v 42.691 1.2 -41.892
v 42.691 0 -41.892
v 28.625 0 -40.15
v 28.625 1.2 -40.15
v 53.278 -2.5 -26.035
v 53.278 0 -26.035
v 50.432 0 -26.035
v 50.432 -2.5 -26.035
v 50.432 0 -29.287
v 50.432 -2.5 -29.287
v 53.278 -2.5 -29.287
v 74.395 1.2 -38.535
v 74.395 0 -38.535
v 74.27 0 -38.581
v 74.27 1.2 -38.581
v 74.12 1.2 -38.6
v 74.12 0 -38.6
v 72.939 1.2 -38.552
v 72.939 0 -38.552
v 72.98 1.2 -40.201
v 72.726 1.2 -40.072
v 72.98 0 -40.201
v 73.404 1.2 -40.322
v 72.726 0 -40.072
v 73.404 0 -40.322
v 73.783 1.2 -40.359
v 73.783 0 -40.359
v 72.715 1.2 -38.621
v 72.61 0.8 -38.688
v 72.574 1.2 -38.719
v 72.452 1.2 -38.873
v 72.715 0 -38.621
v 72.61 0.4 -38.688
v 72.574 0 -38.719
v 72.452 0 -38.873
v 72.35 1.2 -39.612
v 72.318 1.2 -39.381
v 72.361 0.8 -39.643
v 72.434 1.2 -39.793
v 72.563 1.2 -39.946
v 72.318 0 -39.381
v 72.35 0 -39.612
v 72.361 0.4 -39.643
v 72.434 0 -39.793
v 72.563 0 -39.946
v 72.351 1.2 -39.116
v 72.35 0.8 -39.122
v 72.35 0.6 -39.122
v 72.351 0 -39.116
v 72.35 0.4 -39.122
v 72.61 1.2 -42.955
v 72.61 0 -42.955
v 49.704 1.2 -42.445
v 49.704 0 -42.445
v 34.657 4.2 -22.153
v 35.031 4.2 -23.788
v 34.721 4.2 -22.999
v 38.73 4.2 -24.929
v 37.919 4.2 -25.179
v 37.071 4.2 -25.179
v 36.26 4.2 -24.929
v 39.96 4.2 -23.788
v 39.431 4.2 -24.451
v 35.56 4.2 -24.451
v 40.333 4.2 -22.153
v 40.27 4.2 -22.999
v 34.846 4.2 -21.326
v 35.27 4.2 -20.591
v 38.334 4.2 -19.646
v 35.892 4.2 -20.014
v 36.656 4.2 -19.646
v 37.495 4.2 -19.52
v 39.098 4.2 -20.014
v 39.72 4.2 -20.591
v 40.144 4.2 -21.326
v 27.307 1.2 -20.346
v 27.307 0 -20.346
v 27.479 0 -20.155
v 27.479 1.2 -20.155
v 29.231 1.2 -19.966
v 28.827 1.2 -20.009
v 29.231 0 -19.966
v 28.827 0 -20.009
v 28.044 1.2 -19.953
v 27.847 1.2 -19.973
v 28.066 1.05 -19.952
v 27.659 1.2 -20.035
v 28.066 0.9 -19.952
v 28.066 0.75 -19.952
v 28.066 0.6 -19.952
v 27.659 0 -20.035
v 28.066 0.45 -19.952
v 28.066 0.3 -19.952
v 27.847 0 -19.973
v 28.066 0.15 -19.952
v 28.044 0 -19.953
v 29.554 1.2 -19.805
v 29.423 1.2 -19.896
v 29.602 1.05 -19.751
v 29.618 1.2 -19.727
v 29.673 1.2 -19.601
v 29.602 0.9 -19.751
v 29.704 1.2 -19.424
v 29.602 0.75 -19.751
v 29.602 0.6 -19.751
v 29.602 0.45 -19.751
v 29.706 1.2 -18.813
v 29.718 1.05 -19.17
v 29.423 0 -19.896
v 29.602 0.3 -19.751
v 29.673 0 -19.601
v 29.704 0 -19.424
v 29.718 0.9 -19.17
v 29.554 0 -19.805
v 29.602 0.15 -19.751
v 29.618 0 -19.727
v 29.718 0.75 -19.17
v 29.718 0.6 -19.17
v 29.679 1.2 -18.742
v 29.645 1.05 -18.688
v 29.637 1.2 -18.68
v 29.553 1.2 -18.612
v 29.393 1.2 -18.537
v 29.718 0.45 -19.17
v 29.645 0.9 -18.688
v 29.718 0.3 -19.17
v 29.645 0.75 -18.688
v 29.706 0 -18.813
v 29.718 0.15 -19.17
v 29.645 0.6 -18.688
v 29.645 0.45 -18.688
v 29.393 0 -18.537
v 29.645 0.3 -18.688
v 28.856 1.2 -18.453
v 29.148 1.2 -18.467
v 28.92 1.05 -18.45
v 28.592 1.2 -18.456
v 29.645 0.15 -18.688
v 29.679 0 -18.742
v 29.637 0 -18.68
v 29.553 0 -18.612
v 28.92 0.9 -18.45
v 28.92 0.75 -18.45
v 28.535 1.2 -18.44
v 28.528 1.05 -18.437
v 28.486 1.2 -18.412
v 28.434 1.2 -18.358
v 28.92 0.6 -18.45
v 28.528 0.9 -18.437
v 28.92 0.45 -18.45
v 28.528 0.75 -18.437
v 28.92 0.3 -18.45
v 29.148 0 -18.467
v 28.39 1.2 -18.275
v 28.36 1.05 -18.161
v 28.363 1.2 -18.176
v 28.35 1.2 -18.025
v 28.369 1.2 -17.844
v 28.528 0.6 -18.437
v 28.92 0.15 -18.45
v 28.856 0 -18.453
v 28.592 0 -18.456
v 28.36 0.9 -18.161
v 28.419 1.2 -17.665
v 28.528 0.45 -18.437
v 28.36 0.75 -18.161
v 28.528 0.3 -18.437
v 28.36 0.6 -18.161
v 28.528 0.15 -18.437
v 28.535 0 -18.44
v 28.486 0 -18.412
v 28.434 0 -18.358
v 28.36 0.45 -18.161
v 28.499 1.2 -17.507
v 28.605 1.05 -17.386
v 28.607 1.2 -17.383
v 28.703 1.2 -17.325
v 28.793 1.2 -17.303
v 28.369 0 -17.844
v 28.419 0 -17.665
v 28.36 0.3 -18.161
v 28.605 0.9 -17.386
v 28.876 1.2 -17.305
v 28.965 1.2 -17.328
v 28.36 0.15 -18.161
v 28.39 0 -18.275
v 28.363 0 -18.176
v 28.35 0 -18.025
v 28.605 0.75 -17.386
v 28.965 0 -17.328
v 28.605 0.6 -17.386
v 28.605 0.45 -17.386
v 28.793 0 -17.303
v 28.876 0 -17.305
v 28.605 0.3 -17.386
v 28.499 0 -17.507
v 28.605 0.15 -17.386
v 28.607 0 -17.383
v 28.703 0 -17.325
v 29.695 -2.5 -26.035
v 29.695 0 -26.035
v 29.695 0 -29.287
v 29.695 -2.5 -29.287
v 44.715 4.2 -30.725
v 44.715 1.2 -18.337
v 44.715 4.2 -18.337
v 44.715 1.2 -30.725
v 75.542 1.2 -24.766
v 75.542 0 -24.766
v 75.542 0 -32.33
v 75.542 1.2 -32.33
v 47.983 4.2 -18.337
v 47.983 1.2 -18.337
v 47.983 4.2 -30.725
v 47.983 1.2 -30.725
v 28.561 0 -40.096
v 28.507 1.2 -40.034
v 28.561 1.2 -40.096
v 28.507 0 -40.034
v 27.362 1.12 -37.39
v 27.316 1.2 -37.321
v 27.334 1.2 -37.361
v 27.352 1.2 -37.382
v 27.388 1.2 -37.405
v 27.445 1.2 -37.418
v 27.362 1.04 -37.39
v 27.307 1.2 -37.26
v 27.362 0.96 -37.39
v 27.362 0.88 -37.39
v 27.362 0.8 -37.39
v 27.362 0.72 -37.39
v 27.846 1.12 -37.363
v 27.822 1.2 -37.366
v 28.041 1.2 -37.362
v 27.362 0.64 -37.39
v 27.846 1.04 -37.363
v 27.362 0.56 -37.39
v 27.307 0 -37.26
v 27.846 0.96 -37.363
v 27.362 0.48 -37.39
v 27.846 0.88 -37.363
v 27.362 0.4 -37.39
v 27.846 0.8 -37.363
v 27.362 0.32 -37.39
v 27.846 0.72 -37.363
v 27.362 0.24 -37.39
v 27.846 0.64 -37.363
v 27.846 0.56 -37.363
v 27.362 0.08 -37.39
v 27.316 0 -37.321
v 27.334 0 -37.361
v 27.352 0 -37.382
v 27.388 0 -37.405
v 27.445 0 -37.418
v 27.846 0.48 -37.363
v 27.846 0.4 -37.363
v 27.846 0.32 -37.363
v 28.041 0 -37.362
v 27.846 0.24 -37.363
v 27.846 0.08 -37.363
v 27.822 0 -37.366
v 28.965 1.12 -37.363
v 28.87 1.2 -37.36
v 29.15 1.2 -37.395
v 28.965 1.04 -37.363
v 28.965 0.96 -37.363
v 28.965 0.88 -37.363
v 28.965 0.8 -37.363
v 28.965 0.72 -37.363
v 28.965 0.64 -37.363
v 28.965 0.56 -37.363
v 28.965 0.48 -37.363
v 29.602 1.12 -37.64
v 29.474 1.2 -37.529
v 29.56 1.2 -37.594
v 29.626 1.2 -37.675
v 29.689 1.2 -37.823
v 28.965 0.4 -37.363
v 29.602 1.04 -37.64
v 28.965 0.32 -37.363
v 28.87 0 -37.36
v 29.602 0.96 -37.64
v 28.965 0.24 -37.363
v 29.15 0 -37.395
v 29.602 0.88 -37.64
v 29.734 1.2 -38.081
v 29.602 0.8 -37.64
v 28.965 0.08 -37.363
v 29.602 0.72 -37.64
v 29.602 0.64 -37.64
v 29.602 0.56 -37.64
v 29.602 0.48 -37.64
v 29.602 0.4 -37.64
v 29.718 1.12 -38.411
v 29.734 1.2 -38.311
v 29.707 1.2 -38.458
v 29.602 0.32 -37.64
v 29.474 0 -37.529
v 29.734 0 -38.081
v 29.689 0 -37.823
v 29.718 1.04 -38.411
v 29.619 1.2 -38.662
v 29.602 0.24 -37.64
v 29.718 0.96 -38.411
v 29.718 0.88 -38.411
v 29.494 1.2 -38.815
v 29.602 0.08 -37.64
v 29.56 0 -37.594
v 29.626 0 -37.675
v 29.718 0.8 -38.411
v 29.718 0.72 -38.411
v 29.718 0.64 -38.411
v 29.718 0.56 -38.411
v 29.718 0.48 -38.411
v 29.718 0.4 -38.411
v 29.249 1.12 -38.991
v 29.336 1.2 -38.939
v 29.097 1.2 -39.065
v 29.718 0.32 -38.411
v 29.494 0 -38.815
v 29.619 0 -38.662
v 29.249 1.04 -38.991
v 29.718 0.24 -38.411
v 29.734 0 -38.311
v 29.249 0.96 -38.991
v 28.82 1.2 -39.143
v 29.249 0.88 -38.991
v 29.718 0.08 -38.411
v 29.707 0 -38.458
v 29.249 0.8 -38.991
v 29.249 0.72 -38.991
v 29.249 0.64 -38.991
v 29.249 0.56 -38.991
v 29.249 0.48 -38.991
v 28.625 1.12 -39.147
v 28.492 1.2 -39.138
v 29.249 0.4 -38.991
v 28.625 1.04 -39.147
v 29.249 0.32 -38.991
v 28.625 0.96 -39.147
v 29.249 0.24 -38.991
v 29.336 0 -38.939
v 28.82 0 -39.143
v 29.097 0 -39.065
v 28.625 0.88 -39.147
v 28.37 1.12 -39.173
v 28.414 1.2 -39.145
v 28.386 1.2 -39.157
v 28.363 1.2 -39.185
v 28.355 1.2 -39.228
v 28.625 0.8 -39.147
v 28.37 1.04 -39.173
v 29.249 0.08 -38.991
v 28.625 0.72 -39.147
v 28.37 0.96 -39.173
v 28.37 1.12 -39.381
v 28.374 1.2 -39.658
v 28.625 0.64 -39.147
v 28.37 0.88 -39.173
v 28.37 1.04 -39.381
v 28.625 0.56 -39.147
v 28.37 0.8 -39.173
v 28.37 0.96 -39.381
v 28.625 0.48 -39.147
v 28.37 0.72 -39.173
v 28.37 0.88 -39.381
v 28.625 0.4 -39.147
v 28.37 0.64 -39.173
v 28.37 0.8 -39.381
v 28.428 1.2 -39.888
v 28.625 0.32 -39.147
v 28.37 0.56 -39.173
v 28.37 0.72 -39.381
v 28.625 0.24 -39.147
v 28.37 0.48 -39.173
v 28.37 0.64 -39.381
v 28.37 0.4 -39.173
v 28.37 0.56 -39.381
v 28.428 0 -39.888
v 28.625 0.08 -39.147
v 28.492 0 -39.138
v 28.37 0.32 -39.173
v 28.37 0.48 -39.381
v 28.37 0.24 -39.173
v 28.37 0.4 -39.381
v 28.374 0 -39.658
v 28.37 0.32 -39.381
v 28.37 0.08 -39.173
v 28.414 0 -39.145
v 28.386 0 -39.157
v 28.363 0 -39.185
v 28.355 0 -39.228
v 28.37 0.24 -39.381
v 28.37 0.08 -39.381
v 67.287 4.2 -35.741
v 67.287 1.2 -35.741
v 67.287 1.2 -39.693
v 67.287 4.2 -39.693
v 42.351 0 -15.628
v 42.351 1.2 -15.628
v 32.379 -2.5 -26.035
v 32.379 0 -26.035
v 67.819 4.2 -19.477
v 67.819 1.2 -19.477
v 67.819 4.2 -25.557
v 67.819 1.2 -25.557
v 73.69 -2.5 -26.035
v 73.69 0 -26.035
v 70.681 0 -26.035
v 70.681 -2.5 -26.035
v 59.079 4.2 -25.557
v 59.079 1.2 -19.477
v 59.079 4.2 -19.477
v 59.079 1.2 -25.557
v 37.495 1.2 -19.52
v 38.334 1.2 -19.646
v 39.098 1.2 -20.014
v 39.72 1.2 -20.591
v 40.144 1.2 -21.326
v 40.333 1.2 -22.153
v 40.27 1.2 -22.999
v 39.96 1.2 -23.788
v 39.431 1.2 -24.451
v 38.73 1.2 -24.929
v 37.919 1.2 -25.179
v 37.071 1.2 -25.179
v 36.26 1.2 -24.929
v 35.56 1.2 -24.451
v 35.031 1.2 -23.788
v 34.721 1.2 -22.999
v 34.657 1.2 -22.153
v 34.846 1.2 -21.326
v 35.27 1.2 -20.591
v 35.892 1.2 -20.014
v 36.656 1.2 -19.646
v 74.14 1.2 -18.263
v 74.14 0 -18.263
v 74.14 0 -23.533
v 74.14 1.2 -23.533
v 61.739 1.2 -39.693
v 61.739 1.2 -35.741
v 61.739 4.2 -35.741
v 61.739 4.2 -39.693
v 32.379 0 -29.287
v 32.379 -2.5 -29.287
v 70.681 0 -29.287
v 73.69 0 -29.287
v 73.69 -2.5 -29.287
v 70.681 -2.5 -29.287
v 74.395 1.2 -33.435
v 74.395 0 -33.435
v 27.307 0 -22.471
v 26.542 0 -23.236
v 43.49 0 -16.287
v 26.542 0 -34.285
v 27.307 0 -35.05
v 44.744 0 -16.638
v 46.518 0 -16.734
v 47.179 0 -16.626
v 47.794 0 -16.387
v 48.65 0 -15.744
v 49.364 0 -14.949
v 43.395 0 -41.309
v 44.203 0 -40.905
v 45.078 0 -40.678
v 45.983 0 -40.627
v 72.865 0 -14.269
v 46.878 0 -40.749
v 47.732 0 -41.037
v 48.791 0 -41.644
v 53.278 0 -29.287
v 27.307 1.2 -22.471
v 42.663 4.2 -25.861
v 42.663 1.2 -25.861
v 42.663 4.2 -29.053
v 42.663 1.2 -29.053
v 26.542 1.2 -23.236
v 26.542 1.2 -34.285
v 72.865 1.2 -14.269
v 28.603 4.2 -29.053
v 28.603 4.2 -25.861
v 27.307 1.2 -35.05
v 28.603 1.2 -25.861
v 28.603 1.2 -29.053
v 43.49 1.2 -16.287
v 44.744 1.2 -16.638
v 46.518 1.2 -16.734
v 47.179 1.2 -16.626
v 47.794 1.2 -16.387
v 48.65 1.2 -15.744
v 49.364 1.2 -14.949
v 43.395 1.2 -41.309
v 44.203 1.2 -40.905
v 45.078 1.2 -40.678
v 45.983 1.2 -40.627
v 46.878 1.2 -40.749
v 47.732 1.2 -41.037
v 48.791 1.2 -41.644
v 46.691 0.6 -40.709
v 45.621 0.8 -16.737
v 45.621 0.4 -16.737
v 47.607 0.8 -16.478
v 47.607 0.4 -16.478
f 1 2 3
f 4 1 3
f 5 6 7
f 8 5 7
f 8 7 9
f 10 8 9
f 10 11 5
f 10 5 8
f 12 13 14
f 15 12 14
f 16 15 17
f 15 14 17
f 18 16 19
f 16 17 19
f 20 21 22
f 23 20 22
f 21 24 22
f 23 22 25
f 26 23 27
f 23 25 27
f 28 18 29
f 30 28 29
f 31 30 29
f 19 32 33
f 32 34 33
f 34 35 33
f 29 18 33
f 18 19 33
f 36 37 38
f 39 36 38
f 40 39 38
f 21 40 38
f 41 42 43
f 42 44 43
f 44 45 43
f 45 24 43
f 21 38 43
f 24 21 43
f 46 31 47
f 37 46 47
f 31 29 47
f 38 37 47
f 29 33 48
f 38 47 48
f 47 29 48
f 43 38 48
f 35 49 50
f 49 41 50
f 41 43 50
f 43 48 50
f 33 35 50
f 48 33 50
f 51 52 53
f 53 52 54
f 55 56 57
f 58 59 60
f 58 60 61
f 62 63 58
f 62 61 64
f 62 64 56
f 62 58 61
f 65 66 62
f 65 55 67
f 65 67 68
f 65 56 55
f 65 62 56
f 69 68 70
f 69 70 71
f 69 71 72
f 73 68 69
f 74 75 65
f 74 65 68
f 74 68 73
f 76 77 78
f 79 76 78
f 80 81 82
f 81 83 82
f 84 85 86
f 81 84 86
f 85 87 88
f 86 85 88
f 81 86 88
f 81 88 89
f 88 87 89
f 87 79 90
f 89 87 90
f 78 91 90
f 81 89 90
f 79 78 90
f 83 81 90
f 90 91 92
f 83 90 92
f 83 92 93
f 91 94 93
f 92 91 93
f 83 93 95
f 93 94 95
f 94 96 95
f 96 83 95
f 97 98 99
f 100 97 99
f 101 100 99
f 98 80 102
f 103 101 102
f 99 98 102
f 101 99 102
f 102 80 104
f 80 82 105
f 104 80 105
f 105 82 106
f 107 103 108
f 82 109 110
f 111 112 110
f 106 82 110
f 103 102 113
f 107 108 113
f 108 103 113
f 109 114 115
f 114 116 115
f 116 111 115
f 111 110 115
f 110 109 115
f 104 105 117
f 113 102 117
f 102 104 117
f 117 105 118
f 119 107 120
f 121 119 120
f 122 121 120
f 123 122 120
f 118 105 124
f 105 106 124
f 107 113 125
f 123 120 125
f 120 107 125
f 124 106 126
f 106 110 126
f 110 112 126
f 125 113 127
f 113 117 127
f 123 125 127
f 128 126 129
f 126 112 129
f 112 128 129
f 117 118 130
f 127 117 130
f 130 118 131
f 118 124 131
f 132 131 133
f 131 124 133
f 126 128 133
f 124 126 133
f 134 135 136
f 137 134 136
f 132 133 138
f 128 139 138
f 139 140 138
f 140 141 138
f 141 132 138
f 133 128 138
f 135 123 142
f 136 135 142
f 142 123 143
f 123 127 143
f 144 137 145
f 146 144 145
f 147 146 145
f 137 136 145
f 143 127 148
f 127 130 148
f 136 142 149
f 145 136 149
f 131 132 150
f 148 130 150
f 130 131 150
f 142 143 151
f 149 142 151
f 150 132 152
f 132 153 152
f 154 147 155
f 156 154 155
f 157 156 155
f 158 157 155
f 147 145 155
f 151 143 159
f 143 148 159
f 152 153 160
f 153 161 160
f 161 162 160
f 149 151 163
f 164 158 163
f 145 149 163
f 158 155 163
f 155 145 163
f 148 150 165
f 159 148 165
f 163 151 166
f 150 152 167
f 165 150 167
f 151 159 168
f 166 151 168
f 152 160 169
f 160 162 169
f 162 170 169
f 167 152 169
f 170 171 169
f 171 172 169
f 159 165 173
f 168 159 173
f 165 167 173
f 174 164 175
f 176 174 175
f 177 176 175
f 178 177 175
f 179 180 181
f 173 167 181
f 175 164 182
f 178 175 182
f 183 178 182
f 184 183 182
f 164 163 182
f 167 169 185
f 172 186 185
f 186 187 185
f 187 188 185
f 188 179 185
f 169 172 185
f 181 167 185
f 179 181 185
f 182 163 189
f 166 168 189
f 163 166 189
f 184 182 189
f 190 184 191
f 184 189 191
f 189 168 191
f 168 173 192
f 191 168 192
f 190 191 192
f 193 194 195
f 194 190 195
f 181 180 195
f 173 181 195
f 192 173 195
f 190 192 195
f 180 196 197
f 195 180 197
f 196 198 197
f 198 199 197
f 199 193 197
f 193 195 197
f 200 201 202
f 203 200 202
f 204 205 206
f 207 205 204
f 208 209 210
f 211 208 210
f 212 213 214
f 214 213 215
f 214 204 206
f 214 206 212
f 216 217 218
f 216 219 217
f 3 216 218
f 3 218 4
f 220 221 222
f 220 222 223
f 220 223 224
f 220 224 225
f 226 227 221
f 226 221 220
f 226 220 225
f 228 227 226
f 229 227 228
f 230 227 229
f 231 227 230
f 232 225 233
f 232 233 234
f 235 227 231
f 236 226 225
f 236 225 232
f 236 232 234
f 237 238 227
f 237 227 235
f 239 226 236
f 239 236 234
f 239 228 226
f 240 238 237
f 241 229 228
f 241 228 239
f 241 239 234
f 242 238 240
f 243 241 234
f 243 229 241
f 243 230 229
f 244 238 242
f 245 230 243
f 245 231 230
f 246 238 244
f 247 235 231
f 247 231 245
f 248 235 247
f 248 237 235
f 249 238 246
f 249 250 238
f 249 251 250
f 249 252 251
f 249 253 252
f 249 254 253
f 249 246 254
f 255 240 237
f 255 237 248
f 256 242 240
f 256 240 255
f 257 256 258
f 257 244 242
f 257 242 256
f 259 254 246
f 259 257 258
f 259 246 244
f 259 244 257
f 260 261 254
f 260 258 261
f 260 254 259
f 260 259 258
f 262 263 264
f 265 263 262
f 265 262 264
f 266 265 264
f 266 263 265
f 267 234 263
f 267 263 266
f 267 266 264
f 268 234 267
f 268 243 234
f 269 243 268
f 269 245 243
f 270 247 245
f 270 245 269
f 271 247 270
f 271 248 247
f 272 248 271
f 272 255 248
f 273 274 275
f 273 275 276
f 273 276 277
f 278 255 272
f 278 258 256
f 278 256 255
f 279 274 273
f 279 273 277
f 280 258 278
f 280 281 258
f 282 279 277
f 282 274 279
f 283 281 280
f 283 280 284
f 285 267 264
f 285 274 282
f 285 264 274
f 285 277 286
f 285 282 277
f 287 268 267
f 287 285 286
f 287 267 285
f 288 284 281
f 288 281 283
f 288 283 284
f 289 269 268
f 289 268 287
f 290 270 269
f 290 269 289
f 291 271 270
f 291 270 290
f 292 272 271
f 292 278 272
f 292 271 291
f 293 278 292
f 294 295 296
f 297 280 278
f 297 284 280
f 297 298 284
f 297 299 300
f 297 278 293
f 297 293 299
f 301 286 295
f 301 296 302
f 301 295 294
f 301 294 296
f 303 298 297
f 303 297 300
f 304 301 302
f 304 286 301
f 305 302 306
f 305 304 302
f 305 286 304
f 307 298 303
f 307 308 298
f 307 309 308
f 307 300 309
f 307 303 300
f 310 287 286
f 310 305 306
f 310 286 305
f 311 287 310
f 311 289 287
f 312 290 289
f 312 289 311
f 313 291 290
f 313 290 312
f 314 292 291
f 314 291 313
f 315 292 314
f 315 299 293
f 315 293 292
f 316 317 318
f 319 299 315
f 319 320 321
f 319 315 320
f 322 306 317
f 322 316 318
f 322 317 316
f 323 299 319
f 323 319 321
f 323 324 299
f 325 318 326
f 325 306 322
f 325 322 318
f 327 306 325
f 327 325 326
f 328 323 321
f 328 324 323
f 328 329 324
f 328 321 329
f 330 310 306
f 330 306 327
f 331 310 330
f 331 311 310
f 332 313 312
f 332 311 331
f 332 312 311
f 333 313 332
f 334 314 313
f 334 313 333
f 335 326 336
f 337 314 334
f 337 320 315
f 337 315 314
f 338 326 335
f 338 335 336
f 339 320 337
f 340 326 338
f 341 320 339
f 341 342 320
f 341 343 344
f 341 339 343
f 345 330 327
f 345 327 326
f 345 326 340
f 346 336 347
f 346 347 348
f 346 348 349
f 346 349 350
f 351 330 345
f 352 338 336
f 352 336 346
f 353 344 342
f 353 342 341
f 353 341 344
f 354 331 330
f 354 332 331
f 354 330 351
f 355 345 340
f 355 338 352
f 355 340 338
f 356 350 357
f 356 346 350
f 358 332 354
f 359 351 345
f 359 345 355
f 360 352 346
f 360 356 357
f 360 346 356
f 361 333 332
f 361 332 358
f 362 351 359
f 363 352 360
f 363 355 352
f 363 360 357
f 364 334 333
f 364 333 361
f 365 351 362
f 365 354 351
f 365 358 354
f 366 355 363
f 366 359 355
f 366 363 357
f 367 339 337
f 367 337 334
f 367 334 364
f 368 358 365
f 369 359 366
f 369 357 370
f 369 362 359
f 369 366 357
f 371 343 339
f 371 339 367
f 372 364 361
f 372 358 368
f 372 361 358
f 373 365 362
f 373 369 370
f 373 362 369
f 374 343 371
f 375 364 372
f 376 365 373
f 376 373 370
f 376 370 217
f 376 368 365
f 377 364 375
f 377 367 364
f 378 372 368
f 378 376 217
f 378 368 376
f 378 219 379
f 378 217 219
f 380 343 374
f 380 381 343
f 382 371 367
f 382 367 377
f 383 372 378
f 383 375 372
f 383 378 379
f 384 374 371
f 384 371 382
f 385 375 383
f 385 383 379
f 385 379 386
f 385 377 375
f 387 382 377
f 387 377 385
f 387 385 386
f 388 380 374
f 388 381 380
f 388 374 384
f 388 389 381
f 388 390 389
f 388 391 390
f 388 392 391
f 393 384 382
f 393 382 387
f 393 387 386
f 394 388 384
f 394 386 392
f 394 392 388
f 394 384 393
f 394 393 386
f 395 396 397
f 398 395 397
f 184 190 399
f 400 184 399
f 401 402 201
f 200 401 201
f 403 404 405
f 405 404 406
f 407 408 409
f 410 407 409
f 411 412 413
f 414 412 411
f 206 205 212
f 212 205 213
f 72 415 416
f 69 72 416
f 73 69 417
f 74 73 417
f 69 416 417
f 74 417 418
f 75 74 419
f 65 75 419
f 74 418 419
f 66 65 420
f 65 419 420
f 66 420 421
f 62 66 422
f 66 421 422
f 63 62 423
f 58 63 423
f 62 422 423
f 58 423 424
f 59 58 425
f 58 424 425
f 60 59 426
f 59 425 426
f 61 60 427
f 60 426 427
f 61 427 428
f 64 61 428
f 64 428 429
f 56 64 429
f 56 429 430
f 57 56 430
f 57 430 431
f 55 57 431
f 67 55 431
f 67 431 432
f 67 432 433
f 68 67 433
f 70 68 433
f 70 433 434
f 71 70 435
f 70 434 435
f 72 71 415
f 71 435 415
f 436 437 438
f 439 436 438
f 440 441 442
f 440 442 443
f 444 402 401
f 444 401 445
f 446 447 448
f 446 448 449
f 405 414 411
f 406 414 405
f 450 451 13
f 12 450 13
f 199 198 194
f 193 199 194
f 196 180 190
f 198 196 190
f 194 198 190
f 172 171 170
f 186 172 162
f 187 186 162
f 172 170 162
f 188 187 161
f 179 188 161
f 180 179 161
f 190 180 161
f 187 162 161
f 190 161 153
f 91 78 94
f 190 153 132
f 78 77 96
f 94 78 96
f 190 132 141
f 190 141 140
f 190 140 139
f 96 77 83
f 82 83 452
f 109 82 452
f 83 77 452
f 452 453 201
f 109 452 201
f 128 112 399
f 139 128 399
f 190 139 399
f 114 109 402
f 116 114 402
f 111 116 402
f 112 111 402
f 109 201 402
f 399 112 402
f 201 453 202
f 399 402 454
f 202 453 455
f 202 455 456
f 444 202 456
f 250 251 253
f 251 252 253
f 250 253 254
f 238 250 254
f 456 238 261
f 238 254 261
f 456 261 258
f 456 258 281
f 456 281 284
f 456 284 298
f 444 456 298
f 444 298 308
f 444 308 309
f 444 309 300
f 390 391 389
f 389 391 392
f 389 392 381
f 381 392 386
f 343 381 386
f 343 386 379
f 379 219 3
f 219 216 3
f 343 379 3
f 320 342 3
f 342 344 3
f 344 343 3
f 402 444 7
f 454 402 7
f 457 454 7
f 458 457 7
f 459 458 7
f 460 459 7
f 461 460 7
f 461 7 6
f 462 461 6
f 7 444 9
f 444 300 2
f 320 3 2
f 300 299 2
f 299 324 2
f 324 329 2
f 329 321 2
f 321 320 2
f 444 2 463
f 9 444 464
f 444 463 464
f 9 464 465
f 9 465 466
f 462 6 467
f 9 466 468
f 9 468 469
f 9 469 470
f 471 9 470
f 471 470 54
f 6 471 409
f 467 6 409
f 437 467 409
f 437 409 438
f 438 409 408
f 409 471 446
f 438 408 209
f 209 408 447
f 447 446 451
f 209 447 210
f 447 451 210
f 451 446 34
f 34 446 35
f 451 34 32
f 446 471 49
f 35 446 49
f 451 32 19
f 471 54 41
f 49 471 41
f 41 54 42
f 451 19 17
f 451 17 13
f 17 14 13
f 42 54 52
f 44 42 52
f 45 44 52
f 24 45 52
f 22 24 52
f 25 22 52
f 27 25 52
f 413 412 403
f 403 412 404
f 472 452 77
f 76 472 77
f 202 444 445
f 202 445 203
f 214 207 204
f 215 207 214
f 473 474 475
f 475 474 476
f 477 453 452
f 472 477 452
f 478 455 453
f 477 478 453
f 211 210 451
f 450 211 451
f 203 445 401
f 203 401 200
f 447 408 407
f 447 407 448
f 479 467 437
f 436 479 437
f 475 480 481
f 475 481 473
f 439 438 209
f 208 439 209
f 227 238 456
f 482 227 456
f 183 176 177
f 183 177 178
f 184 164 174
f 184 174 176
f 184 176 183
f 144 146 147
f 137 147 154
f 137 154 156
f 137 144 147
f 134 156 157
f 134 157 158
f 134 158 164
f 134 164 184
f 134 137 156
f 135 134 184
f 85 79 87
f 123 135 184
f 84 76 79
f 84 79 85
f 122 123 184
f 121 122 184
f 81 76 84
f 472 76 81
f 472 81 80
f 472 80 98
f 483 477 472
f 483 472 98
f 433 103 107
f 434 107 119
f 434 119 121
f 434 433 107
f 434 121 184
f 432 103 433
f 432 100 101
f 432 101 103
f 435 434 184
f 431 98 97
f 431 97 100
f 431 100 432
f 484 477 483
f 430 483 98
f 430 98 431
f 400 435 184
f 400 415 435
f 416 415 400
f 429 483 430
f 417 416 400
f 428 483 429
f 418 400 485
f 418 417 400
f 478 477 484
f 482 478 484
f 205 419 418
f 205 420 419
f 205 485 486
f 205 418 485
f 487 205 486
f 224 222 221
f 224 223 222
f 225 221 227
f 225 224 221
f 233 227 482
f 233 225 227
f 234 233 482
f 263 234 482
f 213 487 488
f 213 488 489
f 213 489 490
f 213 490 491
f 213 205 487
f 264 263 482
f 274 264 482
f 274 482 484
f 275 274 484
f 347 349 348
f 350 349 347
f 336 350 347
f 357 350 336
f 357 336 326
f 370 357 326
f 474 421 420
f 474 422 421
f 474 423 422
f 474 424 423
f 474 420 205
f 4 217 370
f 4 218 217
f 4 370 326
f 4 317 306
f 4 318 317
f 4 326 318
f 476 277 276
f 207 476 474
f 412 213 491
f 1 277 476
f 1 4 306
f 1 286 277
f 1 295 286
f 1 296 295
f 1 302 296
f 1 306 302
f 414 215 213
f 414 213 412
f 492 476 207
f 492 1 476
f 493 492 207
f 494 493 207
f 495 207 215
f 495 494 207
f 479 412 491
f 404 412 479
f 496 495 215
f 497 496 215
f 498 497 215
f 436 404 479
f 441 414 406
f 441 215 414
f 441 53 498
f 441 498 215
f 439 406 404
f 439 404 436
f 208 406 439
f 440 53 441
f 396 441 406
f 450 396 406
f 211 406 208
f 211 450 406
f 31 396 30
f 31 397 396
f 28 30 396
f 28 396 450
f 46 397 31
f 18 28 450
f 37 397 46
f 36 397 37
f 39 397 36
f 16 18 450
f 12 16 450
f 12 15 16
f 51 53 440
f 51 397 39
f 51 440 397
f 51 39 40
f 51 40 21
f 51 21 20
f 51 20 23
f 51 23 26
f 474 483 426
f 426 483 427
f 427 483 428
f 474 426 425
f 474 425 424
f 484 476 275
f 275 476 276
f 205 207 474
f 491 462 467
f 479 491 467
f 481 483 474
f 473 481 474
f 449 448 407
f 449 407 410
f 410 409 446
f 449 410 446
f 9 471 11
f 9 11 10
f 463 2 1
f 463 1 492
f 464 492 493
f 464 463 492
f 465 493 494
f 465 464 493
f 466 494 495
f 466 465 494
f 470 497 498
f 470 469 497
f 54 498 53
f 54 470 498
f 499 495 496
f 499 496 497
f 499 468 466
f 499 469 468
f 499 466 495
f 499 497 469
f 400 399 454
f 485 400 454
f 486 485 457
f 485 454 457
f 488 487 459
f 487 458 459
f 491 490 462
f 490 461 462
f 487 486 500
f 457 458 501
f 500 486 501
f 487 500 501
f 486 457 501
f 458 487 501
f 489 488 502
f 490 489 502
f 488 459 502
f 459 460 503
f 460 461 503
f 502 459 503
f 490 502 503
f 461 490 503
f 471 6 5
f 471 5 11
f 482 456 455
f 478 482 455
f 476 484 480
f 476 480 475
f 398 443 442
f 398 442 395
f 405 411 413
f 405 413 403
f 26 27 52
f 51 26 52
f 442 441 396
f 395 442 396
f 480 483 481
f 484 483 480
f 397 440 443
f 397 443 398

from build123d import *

# Parameters (mm, degrees)
EXTRUDE_1_DEPTH = 1.2
SKETCH_2_R      = 2.845685889
SKETCH_2_W      = 8.739987145
SKETCH_2_H      = 6.079991058
SKETCH_2_W_2    = 5.547991841
SKETCH_2_H_2    = 3.951994188
SKETCH_2_W_3    = 14.059979321
SKETCH_2_H_3    = 3.191995305
SKETCH_2_W_4    = 3.267995194
SKETCH_2_H_4    = 12.38798178
EXTRUDE_2_DEPTH = 3
SKETCH_3_W      = 2.683606537
SKETCH_3_H      = 3.252856408
SKETCH_3_W_2    = 2.846249357
SKETCH_3_W_3    = 3.008892177
EXTRUDE_3_DEPTH = 2.5


with BuildPart() as part:
    # 草图1 → 凸台-拉伸1 (new body)
    with BuildSketch(Plane(origin=(0, 0, 0), x_dir=(1, 0, 0), z_dir=(0, 1, 0))):
        with BuildLine():
            Line((26.542234899, 34.28501498), (26.542234899, 23.235578727))
            Line((26.542234899, 23.235578727), (27.30719587, 22.470617756))
            Line((27.30719587, 22.470617756), (27.30719587, 20.345726169))
            add(Edge.make_bspline(
                [(27.30719587, 20.345726169), (27.766366726, 19.710473493), (28.533192041, 20.17567494), (29.707597035, 19.856281374), (29.708705733, 19.21261025), (29.749927114, 18.697849945), (29.332093975, 18.49948094), (28.972099363, 18.416631461), (28.09146585, 18.591532269), (28.396219588, 17.109853086), (28.964611308, 17.328380115)],
                knots=[0, 0, 0, 0, 0.289961436, 0.402397786, 0.499466996, 0.579199453, 0.625291902, 0.705975123, 0.770289418, 1, 1, 1, 1], degree=3))
            Line((28.964611308, 17.328380115), (42.351428307, 15.628466845))
            add(Edge.make_bspline(
                [(42.351428307, 15.628466845), (43.299365142, 16.370621016), (45.080658031, 16.834578894), (47.822138144, 16.706281246), (48.888212373, 15.536804191), (49.363570545, 14.948501537)],
                knots=[0, 0, 0, 0, 0.445650104, 0.701196625, 1, 1, 1, 1], degree=3))
            Line((49.363570545, 14.948501537), (72.864871499, 14.268536229))
            Line((72.864871499, 14.268536229), (74.139806451, 18.263332413))
            Line((74.139806451, 18.263332413), (74.139806451, 23.533063549))
            Line((74.139806451, 23.533063549), (75.542234899, 24.76550067))
            Line((75.542234899, 24.76550067), (75.542234899, 32.33011472))
            Line((75.542234899, 32.33011472), (74.394793442, 33.435058346))
            Line((74.394793442, 33.435058346), (74.394793442, 38.534798155))
            add(Edge.make_bspline(
                [(74.394793442, 38.534798155), (74.008968349, 38.755438485), (72.555688158, 38.085290889), (72.06904566, 40.063916184), (73.345250089, 40.358200505), (73.783172645, 40.358894346)],
                knots=[0, 0, 0, 0, 0.405657606, 0.627639172, 1, 1, 1, 1], degree=3))
            Line((73.783172645, 40.358894346), (72.609884509, 42.954572656))
            Line((72.609884509, 42.954572656), (49.703553199, 42.444598675))
            add(Edge.make_bspline(
                [(42.691410961, 41.892126862), (43.709779178, 40.816409962), (46.555302503, 40.12135972), (48.90606063, 41.598404573), (49.703553199, 42.444598675)],
                knots=[0, 0, 0, 0, 0.550222151, 1, 1, 1, 1], degree=3))
            Line((42.691410961, 41.892126862), (28.624628654, 40.149715761))
            add(Edge.make_bspline(
                [(27.30719587, 37.259863202), (27.314631273, 37.521835862), (27.83069071, 37.292457691), (28.353409591, 37.437127103), (28.876361187, 37.314153988), (29.318642161, 37.435275806), (29.642981163, 37.616513103), (29.737932693, 37.999534231), (29.755327437, 38.364651638), (29.597769614, 38.753626796), (29.303190466, 38.978604337), (28.951869554, 39.131064843), (28.681716421, 39.165816683), (28.311148089, 39.104787343), (28.381856335, 39.379281333), (28.349673781, 39.705099267), (28.436926255, 40.018809553), (28.624628654, 40.149715761)],
                knots=[0, 0, 0, 0, 0.103745759, 0.179480698, 0.291749409, 0.356068651, 0.410237906, 0.46747416, 0.543083375, 0.593547176, 0.671677835, 0.723593794, 0.780978391, 0.824016838, 0.858913398, 0.887993865, 1, 1, 1, 1], degree=3))
            Line((27.30719587, 37.259863202), (27.30719587, 35.049975952))
            Line((27.30719587, 35.049975952), (26.542234899, 34.28501498))
        make_face()
    extrude(amount=EXTRUDE_1_DEPTH)

    # 草图2 → 凸台-拉伸2 (add)
    with BuildSketch(Plane(origin=(0, 1.2, 0), x_dir=(1, 0, 0), z_dir=(0, 1, 0))):
        with Locations(Location((37.495180045, 22.365434172, 0), (0, 0, 270))):
            Circle(SKETCH_2_R)
        with Locations((63.449141874, 22.517433948)):
            Rectangle(SKETCH_2_W, SKETCH_2_H)
        with Locations((64.513140308, 37.717411593)):
            Rectangle(SKETCH_2_W_2, SKETCH_2_H_2)
        with Locations((35.633182784, 27.457426682)):
            Rectangle(SKETCH_2_W_3, SKETCH_2_H_3)
        with Locations((46.349167023, 24.531430986)):
            Rectangle(SKETCH_2_W_4, SKETCH_2_H_4)
    extrude(amount=EXTRUDE_2_DEPTH)

    # 草图3 → 凸台-拉伸3 (add)
    with BuildSketch(Plane(origin=(0, 0, 0), x_dir=(-1, 0, 0), z_dir=(0, -1, 0))):
        with Locations((-31.036851076, 27.66097912)):
            Rectangle(SKETCH_3_W, SKETCH_3_H)
        with Locations((-51.855132088, 27.66097912)):
            Rectangle(SKETCH_3_W_2, SKETCH_3_H)
        with Locations((-72.185484637, 27.66097912)):
            Rectangle(SKETCH_3_W_3, SKETCH_3_H)
    extrude(amount=EXTRUDE_3_DEPTH)


solid = part.part
